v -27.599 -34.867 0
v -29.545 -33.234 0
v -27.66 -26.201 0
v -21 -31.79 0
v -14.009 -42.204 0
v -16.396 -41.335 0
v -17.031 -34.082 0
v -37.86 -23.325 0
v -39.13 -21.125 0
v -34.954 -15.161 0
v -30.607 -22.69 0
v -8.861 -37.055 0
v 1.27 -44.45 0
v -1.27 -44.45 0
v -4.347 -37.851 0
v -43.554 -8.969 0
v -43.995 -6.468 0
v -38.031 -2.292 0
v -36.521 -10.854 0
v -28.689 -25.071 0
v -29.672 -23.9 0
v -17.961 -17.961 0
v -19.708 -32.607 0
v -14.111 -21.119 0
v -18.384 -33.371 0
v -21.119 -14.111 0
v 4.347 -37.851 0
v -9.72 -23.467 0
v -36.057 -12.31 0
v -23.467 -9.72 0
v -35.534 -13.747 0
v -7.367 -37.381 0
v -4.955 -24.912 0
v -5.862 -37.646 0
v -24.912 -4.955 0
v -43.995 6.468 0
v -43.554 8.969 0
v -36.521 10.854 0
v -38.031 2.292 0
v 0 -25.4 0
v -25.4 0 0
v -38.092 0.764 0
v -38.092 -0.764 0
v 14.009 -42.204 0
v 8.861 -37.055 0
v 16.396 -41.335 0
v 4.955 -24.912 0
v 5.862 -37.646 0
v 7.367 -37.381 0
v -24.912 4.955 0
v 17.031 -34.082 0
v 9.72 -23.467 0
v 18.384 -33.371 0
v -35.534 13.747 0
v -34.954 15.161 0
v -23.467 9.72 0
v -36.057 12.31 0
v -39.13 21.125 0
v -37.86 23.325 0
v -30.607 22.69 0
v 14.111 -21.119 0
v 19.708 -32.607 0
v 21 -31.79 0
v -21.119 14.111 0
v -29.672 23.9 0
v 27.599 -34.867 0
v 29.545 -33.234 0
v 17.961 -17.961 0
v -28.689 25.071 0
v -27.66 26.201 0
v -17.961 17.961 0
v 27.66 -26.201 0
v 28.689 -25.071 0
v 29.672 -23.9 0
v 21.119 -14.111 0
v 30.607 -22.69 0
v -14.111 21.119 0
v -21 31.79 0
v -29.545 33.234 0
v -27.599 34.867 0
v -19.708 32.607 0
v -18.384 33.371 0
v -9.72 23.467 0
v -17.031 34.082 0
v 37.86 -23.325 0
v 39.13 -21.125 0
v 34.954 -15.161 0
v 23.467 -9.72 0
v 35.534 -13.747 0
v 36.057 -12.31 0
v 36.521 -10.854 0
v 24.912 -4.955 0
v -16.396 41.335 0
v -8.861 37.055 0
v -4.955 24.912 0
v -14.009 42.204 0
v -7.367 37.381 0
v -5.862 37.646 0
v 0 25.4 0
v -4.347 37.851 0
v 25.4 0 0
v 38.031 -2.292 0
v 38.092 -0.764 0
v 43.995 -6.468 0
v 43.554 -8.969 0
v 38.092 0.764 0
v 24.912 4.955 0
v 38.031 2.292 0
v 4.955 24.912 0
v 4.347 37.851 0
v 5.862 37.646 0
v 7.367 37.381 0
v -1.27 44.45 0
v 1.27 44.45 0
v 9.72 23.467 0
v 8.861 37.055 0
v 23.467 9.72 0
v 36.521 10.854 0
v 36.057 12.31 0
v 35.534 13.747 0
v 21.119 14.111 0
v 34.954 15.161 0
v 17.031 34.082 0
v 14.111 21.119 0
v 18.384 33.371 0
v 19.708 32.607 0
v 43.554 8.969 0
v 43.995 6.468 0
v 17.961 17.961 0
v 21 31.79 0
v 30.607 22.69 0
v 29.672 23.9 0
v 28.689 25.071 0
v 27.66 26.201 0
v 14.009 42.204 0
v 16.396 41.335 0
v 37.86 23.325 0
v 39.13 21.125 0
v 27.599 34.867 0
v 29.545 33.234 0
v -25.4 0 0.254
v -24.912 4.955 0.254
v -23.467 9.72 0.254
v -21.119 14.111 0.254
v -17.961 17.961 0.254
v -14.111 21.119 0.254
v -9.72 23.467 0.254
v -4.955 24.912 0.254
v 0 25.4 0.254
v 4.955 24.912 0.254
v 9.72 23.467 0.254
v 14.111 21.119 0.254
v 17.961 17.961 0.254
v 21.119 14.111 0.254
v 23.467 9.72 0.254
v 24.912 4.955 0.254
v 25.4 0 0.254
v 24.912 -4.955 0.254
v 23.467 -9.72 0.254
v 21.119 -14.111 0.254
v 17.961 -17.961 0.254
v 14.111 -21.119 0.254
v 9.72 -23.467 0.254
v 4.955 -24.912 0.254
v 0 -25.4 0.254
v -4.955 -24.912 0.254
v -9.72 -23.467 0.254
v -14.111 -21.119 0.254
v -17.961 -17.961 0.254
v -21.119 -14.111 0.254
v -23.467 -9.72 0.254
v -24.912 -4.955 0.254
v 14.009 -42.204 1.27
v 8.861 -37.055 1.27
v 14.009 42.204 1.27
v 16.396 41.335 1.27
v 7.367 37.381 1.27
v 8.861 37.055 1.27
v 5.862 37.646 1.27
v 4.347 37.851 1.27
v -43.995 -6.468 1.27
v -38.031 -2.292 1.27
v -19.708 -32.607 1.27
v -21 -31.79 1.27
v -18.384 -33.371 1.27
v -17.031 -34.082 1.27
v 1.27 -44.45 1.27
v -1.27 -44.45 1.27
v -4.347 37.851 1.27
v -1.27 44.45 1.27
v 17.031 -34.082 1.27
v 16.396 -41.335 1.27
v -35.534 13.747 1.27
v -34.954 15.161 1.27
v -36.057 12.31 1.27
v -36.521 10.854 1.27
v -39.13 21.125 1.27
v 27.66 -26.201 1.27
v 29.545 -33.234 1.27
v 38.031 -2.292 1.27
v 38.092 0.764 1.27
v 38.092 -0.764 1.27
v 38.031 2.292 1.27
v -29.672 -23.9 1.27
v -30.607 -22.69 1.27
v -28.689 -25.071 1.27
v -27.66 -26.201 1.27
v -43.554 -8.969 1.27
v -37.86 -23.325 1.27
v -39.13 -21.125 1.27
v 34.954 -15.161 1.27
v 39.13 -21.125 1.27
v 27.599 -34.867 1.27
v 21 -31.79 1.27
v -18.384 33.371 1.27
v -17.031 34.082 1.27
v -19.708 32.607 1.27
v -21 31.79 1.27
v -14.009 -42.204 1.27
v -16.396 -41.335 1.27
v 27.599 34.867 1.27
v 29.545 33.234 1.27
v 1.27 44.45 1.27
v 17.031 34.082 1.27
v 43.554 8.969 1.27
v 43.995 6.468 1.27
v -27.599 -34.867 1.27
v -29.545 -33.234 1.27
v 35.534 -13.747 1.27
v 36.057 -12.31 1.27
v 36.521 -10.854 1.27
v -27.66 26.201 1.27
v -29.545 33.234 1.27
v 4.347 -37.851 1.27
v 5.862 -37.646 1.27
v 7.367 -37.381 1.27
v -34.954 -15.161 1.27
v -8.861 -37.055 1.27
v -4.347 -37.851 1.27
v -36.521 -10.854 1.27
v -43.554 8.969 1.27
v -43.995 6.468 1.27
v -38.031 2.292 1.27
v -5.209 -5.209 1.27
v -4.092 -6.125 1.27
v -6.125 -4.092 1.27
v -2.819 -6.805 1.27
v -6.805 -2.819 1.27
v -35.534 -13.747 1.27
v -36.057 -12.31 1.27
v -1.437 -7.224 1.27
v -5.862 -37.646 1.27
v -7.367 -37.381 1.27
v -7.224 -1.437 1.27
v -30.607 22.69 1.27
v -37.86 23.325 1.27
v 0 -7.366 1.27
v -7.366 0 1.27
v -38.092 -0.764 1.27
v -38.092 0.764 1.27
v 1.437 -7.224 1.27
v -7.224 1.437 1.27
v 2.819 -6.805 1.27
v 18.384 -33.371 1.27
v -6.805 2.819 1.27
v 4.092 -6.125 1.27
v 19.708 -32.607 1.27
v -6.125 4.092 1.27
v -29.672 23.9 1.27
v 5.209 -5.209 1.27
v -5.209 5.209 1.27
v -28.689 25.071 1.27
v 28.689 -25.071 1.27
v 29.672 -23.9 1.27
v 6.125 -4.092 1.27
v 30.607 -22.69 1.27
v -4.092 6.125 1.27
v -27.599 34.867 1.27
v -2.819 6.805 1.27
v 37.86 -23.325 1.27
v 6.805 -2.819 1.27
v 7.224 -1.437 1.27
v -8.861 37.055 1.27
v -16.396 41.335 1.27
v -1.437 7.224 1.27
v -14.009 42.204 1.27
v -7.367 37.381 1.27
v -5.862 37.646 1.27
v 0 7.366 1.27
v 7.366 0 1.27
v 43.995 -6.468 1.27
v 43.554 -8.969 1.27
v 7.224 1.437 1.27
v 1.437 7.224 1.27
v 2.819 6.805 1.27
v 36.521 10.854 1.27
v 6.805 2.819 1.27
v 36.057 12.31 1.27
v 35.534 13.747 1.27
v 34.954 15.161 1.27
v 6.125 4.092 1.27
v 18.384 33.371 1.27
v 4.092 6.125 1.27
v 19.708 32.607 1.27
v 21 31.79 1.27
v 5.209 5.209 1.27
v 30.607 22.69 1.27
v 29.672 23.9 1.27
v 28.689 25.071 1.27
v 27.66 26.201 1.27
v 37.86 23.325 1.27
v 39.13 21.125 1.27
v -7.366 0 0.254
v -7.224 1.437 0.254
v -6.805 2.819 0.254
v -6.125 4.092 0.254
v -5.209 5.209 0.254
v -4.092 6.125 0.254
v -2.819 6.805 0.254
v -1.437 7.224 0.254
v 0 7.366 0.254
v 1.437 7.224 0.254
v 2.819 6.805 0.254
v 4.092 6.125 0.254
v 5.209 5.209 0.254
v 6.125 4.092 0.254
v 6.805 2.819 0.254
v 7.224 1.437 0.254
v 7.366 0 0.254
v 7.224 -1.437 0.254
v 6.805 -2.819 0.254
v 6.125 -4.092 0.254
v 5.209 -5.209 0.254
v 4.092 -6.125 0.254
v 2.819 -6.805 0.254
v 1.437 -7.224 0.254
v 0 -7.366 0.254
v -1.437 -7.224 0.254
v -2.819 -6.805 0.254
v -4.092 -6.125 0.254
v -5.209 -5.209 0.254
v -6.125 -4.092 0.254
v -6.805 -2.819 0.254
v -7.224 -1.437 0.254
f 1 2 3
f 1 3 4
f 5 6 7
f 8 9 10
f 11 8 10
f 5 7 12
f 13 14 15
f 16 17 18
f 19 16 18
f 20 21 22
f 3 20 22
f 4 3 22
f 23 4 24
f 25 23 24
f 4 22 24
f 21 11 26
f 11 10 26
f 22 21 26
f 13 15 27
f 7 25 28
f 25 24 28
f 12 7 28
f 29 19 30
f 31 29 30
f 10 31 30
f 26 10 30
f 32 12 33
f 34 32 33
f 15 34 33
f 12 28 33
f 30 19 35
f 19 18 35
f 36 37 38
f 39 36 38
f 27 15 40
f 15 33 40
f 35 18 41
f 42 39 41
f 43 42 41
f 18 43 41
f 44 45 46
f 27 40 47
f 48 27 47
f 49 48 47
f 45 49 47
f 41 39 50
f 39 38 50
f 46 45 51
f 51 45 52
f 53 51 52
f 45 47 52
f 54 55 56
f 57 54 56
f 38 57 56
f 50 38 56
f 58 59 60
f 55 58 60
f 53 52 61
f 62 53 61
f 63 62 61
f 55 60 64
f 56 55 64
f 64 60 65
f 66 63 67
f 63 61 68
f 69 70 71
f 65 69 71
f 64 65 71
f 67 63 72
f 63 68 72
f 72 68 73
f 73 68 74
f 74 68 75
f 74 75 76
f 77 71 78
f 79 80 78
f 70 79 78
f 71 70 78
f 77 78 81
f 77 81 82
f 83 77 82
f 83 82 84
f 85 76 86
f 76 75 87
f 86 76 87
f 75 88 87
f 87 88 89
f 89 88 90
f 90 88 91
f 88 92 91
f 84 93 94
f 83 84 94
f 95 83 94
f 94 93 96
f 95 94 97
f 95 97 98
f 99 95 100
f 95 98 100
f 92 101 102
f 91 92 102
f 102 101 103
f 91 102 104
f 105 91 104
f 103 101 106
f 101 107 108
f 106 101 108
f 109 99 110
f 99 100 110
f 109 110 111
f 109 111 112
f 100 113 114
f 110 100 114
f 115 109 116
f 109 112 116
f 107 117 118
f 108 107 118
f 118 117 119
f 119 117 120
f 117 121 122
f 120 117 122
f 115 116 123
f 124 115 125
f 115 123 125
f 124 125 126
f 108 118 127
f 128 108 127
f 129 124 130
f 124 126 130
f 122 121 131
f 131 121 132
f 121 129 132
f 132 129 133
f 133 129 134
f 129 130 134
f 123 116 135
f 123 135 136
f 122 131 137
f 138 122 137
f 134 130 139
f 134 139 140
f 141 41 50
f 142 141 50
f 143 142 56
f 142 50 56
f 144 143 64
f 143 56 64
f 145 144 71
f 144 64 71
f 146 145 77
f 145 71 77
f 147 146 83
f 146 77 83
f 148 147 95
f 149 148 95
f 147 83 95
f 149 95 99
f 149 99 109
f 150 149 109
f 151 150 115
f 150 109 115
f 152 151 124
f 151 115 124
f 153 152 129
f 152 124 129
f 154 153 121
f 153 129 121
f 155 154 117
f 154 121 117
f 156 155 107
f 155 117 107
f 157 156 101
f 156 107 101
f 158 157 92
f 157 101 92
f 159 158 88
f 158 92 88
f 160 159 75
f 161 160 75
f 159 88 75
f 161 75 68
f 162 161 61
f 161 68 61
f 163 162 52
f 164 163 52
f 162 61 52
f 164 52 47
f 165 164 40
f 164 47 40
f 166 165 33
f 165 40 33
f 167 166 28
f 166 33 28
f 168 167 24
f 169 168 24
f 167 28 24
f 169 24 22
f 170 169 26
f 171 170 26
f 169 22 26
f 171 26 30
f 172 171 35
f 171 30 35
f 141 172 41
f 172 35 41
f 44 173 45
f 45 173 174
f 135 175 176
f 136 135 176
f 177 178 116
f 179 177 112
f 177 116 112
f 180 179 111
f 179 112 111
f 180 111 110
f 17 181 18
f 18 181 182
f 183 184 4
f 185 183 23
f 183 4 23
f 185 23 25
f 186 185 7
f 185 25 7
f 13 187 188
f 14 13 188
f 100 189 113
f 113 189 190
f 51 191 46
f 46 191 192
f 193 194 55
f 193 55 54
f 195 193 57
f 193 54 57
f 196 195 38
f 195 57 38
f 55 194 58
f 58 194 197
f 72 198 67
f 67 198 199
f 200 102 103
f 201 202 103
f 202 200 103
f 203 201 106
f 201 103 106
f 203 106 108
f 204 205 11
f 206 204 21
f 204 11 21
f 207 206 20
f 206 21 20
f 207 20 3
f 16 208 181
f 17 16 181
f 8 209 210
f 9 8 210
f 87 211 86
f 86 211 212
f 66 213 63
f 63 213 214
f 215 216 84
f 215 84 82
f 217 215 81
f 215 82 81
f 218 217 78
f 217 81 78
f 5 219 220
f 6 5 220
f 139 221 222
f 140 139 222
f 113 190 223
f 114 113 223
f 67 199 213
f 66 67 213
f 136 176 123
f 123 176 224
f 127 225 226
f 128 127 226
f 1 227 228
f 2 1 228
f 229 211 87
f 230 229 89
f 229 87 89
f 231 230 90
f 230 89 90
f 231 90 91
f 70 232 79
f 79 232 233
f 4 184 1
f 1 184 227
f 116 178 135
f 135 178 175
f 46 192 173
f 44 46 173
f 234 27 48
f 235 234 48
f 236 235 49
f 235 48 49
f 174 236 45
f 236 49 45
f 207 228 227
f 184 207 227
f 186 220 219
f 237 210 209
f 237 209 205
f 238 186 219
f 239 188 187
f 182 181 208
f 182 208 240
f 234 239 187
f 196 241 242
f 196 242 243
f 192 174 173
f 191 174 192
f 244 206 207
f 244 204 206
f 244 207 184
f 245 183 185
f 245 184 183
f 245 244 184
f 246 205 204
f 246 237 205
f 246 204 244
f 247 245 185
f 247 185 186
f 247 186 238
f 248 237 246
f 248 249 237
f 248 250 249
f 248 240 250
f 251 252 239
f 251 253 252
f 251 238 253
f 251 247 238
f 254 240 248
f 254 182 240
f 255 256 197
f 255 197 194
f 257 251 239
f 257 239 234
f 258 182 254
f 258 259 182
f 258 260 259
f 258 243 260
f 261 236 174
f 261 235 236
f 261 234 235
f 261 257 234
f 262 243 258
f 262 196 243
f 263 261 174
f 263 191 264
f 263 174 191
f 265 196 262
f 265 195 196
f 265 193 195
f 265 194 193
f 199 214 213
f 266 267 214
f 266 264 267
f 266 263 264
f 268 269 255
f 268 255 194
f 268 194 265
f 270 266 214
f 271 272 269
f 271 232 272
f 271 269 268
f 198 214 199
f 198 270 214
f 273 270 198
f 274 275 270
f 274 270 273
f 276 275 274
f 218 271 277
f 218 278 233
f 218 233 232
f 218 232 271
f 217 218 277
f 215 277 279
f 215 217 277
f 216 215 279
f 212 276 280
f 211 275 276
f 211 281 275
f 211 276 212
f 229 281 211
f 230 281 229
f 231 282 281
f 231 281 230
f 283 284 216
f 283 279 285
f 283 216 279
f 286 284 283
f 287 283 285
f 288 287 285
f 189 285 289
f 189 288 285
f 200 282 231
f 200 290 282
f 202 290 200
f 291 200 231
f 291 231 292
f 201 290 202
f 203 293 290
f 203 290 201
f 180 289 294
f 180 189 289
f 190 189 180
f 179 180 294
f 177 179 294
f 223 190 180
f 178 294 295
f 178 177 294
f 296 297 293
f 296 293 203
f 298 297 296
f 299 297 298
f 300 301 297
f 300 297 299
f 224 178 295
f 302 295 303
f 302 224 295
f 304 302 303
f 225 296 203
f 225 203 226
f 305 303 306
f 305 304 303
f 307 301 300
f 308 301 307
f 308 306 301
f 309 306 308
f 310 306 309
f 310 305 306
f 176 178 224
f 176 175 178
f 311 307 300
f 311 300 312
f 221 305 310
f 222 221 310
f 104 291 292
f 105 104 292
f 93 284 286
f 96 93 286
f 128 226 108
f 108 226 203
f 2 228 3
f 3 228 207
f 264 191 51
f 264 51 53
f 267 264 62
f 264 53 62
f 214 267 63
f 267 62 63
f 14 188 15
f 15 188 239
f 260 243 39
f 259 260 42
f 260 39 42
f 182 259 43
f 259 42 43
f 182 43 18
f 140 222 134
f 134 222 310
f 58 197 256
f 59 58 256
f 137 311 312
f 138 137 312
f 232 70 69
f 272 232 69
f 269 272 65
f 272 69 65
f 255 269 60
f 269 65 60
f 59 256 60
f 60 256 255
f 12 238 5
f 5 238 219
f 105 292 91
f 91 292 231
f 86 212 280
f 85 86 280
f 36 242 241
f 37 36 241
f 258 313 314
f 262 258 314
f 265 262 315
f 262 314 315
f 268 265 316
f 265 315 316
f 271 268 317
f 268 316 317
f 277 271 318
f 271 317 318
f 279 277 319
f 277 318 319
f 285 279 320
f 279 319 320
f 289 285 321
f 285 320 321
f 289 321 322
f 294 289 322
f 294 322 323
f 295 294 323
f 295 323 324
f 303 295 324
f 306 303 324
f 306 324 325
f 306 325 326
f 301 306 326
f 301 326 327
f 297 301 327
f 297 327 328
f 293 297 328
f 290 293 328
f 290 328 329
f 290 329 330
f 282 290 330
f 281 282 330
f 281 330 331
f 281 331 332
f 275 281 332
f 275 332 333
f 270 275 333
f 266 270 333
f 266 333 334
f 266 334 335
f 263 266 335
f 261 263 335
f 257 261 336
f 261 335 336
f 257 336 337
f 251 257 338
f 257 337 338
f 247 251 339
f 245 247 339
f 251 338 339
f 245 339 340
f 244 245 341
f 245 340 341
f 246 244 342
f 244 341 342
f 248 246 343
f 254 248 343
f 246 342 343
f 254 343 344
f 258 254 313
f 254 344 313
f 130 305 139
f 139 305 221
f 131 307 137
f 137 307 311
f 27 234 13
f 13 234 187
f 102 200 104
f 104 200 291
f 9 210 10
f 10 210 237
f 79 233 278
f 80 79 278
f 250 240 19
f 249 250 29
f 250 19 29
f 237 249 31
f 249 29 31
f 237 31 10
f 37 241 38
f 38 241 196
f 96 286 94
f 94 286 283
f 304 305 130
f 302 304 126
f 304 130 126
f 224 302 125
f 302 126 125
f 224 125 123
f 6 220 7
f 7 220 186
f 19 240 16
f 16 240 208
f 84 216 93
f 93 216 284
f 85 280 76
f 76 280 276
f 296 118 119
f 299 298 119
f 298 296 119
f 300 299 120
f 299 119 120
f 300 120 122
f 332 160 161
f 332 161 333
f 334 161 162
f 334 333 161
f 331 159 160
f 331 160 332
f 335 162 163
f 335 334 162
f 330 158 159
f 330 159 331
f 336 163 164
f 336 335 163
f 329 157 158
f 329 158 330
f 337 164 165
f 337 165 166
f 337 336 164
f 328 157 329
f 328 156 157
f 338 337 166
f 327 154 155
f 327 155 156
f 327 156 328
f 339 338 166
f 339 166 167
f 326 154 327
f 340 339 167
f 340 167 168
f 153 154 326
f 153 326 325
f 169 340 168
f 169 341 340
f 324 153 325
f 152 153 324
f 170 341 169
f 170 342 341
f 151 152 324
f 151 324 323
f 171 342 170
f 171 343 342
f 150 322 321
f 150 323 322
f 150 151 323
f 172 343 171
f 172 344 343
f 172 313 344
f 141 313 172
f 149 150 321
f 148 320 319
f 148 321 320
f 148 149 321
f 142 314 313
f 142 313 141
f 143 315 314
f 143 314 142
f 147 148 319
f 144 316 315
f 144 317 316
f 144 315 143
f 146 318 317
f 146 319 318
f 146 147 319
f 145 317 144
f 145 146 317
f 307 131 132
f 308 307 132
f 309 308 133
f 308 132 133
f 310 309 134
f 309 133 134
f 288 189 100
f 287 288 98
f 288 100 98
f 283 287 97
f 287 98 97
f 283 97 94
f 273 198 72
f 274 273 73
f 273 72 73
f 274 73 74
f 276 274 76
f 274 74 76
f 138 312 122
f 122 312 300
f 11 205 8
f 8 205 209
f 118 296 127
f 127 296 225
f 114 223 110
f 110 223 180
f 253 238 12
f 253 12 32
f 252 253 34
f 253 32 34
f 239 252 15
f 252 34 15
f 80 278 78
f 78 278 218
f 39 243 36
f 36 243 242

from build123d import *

# Parameters (mm, degrees)
SKETCH1_R           = 38.1
BOSS_EXTRUDE1_DEPTH = 1.27
BOSS_EXTRUDE2_DEPTH = 1.27
SKETCH3_R           = 7.366
CUT_EXTRUDE1_DEPTH  = 10
CIRPATTERN1_COUNT   = 18
SKETCH4_R           = 25.4
CUT_EXTRUDE2_DEPTH  = 0.254


with BuildPart() as part:
    # Sketch1 → Boss-Extrude1 (new body)
    with BuildSketch(Plane.XY):
        Circle(SKETCH1_R)
    extrude(amount=BOSS_EXTRUDE1_DEPTH)

    # Sketch2 → Boss-Extrude2 (add)
    with BuildSketch(Plane.XY.offset(1.27)):
        with BuildLine():
            Line((-1.27, 44.45), (1.27, 44.45))
            Line((1.27, 44.45), (4.347073366, 37.851194871))
            ThreePointArc((4.347073366, 37.851194871), (0, 38.1), (-4.347073366, 37.851194871))
            Line((-4.347073366, 37.851194871), (-1.27, 44.45))
        make_face()
    boss_extrude2 = extrude(amount=-BOSS_EXTRUDE2_DEPTH)

    # Sketch3 → Cut-Extrude1 (cut)
    with BuildSketch(Plane(origin=(0, 0, 0), x_dir=(-1, 0, 0), z_dir=(0, 0, -1))):
        Circle(SKETCH3_R)
    extrude(amount=-CUT_EXTRUDE1_DEPTH, mode=Mode.SUBTRACT)

    # CirPattern1: Boss-Extrude2 ×18 about axis
    cirpattern1_axis = Axis((0, 0, 0), (0, 0, 1))
    for i in range(1, CIRPATTERN1_COUNT):
        add(boss_extrude2.rotate(cirpattern1_axis, i * 360 / CIRPATTERN1_COUNT))

    # Sketch4 → Cut-Extrude2 (cut)
    with BuildSketch(Plane(origin=(0, 0, 0), x_dir=(-1, 0, 0), z_dir=(0, 0, -1))):
        Circle(SKETCH4_R)
    extrude(amount=-CUT_EXTRUDE2_DEPTH, mode=Mode.SUBTRACT)


solid = part.part
